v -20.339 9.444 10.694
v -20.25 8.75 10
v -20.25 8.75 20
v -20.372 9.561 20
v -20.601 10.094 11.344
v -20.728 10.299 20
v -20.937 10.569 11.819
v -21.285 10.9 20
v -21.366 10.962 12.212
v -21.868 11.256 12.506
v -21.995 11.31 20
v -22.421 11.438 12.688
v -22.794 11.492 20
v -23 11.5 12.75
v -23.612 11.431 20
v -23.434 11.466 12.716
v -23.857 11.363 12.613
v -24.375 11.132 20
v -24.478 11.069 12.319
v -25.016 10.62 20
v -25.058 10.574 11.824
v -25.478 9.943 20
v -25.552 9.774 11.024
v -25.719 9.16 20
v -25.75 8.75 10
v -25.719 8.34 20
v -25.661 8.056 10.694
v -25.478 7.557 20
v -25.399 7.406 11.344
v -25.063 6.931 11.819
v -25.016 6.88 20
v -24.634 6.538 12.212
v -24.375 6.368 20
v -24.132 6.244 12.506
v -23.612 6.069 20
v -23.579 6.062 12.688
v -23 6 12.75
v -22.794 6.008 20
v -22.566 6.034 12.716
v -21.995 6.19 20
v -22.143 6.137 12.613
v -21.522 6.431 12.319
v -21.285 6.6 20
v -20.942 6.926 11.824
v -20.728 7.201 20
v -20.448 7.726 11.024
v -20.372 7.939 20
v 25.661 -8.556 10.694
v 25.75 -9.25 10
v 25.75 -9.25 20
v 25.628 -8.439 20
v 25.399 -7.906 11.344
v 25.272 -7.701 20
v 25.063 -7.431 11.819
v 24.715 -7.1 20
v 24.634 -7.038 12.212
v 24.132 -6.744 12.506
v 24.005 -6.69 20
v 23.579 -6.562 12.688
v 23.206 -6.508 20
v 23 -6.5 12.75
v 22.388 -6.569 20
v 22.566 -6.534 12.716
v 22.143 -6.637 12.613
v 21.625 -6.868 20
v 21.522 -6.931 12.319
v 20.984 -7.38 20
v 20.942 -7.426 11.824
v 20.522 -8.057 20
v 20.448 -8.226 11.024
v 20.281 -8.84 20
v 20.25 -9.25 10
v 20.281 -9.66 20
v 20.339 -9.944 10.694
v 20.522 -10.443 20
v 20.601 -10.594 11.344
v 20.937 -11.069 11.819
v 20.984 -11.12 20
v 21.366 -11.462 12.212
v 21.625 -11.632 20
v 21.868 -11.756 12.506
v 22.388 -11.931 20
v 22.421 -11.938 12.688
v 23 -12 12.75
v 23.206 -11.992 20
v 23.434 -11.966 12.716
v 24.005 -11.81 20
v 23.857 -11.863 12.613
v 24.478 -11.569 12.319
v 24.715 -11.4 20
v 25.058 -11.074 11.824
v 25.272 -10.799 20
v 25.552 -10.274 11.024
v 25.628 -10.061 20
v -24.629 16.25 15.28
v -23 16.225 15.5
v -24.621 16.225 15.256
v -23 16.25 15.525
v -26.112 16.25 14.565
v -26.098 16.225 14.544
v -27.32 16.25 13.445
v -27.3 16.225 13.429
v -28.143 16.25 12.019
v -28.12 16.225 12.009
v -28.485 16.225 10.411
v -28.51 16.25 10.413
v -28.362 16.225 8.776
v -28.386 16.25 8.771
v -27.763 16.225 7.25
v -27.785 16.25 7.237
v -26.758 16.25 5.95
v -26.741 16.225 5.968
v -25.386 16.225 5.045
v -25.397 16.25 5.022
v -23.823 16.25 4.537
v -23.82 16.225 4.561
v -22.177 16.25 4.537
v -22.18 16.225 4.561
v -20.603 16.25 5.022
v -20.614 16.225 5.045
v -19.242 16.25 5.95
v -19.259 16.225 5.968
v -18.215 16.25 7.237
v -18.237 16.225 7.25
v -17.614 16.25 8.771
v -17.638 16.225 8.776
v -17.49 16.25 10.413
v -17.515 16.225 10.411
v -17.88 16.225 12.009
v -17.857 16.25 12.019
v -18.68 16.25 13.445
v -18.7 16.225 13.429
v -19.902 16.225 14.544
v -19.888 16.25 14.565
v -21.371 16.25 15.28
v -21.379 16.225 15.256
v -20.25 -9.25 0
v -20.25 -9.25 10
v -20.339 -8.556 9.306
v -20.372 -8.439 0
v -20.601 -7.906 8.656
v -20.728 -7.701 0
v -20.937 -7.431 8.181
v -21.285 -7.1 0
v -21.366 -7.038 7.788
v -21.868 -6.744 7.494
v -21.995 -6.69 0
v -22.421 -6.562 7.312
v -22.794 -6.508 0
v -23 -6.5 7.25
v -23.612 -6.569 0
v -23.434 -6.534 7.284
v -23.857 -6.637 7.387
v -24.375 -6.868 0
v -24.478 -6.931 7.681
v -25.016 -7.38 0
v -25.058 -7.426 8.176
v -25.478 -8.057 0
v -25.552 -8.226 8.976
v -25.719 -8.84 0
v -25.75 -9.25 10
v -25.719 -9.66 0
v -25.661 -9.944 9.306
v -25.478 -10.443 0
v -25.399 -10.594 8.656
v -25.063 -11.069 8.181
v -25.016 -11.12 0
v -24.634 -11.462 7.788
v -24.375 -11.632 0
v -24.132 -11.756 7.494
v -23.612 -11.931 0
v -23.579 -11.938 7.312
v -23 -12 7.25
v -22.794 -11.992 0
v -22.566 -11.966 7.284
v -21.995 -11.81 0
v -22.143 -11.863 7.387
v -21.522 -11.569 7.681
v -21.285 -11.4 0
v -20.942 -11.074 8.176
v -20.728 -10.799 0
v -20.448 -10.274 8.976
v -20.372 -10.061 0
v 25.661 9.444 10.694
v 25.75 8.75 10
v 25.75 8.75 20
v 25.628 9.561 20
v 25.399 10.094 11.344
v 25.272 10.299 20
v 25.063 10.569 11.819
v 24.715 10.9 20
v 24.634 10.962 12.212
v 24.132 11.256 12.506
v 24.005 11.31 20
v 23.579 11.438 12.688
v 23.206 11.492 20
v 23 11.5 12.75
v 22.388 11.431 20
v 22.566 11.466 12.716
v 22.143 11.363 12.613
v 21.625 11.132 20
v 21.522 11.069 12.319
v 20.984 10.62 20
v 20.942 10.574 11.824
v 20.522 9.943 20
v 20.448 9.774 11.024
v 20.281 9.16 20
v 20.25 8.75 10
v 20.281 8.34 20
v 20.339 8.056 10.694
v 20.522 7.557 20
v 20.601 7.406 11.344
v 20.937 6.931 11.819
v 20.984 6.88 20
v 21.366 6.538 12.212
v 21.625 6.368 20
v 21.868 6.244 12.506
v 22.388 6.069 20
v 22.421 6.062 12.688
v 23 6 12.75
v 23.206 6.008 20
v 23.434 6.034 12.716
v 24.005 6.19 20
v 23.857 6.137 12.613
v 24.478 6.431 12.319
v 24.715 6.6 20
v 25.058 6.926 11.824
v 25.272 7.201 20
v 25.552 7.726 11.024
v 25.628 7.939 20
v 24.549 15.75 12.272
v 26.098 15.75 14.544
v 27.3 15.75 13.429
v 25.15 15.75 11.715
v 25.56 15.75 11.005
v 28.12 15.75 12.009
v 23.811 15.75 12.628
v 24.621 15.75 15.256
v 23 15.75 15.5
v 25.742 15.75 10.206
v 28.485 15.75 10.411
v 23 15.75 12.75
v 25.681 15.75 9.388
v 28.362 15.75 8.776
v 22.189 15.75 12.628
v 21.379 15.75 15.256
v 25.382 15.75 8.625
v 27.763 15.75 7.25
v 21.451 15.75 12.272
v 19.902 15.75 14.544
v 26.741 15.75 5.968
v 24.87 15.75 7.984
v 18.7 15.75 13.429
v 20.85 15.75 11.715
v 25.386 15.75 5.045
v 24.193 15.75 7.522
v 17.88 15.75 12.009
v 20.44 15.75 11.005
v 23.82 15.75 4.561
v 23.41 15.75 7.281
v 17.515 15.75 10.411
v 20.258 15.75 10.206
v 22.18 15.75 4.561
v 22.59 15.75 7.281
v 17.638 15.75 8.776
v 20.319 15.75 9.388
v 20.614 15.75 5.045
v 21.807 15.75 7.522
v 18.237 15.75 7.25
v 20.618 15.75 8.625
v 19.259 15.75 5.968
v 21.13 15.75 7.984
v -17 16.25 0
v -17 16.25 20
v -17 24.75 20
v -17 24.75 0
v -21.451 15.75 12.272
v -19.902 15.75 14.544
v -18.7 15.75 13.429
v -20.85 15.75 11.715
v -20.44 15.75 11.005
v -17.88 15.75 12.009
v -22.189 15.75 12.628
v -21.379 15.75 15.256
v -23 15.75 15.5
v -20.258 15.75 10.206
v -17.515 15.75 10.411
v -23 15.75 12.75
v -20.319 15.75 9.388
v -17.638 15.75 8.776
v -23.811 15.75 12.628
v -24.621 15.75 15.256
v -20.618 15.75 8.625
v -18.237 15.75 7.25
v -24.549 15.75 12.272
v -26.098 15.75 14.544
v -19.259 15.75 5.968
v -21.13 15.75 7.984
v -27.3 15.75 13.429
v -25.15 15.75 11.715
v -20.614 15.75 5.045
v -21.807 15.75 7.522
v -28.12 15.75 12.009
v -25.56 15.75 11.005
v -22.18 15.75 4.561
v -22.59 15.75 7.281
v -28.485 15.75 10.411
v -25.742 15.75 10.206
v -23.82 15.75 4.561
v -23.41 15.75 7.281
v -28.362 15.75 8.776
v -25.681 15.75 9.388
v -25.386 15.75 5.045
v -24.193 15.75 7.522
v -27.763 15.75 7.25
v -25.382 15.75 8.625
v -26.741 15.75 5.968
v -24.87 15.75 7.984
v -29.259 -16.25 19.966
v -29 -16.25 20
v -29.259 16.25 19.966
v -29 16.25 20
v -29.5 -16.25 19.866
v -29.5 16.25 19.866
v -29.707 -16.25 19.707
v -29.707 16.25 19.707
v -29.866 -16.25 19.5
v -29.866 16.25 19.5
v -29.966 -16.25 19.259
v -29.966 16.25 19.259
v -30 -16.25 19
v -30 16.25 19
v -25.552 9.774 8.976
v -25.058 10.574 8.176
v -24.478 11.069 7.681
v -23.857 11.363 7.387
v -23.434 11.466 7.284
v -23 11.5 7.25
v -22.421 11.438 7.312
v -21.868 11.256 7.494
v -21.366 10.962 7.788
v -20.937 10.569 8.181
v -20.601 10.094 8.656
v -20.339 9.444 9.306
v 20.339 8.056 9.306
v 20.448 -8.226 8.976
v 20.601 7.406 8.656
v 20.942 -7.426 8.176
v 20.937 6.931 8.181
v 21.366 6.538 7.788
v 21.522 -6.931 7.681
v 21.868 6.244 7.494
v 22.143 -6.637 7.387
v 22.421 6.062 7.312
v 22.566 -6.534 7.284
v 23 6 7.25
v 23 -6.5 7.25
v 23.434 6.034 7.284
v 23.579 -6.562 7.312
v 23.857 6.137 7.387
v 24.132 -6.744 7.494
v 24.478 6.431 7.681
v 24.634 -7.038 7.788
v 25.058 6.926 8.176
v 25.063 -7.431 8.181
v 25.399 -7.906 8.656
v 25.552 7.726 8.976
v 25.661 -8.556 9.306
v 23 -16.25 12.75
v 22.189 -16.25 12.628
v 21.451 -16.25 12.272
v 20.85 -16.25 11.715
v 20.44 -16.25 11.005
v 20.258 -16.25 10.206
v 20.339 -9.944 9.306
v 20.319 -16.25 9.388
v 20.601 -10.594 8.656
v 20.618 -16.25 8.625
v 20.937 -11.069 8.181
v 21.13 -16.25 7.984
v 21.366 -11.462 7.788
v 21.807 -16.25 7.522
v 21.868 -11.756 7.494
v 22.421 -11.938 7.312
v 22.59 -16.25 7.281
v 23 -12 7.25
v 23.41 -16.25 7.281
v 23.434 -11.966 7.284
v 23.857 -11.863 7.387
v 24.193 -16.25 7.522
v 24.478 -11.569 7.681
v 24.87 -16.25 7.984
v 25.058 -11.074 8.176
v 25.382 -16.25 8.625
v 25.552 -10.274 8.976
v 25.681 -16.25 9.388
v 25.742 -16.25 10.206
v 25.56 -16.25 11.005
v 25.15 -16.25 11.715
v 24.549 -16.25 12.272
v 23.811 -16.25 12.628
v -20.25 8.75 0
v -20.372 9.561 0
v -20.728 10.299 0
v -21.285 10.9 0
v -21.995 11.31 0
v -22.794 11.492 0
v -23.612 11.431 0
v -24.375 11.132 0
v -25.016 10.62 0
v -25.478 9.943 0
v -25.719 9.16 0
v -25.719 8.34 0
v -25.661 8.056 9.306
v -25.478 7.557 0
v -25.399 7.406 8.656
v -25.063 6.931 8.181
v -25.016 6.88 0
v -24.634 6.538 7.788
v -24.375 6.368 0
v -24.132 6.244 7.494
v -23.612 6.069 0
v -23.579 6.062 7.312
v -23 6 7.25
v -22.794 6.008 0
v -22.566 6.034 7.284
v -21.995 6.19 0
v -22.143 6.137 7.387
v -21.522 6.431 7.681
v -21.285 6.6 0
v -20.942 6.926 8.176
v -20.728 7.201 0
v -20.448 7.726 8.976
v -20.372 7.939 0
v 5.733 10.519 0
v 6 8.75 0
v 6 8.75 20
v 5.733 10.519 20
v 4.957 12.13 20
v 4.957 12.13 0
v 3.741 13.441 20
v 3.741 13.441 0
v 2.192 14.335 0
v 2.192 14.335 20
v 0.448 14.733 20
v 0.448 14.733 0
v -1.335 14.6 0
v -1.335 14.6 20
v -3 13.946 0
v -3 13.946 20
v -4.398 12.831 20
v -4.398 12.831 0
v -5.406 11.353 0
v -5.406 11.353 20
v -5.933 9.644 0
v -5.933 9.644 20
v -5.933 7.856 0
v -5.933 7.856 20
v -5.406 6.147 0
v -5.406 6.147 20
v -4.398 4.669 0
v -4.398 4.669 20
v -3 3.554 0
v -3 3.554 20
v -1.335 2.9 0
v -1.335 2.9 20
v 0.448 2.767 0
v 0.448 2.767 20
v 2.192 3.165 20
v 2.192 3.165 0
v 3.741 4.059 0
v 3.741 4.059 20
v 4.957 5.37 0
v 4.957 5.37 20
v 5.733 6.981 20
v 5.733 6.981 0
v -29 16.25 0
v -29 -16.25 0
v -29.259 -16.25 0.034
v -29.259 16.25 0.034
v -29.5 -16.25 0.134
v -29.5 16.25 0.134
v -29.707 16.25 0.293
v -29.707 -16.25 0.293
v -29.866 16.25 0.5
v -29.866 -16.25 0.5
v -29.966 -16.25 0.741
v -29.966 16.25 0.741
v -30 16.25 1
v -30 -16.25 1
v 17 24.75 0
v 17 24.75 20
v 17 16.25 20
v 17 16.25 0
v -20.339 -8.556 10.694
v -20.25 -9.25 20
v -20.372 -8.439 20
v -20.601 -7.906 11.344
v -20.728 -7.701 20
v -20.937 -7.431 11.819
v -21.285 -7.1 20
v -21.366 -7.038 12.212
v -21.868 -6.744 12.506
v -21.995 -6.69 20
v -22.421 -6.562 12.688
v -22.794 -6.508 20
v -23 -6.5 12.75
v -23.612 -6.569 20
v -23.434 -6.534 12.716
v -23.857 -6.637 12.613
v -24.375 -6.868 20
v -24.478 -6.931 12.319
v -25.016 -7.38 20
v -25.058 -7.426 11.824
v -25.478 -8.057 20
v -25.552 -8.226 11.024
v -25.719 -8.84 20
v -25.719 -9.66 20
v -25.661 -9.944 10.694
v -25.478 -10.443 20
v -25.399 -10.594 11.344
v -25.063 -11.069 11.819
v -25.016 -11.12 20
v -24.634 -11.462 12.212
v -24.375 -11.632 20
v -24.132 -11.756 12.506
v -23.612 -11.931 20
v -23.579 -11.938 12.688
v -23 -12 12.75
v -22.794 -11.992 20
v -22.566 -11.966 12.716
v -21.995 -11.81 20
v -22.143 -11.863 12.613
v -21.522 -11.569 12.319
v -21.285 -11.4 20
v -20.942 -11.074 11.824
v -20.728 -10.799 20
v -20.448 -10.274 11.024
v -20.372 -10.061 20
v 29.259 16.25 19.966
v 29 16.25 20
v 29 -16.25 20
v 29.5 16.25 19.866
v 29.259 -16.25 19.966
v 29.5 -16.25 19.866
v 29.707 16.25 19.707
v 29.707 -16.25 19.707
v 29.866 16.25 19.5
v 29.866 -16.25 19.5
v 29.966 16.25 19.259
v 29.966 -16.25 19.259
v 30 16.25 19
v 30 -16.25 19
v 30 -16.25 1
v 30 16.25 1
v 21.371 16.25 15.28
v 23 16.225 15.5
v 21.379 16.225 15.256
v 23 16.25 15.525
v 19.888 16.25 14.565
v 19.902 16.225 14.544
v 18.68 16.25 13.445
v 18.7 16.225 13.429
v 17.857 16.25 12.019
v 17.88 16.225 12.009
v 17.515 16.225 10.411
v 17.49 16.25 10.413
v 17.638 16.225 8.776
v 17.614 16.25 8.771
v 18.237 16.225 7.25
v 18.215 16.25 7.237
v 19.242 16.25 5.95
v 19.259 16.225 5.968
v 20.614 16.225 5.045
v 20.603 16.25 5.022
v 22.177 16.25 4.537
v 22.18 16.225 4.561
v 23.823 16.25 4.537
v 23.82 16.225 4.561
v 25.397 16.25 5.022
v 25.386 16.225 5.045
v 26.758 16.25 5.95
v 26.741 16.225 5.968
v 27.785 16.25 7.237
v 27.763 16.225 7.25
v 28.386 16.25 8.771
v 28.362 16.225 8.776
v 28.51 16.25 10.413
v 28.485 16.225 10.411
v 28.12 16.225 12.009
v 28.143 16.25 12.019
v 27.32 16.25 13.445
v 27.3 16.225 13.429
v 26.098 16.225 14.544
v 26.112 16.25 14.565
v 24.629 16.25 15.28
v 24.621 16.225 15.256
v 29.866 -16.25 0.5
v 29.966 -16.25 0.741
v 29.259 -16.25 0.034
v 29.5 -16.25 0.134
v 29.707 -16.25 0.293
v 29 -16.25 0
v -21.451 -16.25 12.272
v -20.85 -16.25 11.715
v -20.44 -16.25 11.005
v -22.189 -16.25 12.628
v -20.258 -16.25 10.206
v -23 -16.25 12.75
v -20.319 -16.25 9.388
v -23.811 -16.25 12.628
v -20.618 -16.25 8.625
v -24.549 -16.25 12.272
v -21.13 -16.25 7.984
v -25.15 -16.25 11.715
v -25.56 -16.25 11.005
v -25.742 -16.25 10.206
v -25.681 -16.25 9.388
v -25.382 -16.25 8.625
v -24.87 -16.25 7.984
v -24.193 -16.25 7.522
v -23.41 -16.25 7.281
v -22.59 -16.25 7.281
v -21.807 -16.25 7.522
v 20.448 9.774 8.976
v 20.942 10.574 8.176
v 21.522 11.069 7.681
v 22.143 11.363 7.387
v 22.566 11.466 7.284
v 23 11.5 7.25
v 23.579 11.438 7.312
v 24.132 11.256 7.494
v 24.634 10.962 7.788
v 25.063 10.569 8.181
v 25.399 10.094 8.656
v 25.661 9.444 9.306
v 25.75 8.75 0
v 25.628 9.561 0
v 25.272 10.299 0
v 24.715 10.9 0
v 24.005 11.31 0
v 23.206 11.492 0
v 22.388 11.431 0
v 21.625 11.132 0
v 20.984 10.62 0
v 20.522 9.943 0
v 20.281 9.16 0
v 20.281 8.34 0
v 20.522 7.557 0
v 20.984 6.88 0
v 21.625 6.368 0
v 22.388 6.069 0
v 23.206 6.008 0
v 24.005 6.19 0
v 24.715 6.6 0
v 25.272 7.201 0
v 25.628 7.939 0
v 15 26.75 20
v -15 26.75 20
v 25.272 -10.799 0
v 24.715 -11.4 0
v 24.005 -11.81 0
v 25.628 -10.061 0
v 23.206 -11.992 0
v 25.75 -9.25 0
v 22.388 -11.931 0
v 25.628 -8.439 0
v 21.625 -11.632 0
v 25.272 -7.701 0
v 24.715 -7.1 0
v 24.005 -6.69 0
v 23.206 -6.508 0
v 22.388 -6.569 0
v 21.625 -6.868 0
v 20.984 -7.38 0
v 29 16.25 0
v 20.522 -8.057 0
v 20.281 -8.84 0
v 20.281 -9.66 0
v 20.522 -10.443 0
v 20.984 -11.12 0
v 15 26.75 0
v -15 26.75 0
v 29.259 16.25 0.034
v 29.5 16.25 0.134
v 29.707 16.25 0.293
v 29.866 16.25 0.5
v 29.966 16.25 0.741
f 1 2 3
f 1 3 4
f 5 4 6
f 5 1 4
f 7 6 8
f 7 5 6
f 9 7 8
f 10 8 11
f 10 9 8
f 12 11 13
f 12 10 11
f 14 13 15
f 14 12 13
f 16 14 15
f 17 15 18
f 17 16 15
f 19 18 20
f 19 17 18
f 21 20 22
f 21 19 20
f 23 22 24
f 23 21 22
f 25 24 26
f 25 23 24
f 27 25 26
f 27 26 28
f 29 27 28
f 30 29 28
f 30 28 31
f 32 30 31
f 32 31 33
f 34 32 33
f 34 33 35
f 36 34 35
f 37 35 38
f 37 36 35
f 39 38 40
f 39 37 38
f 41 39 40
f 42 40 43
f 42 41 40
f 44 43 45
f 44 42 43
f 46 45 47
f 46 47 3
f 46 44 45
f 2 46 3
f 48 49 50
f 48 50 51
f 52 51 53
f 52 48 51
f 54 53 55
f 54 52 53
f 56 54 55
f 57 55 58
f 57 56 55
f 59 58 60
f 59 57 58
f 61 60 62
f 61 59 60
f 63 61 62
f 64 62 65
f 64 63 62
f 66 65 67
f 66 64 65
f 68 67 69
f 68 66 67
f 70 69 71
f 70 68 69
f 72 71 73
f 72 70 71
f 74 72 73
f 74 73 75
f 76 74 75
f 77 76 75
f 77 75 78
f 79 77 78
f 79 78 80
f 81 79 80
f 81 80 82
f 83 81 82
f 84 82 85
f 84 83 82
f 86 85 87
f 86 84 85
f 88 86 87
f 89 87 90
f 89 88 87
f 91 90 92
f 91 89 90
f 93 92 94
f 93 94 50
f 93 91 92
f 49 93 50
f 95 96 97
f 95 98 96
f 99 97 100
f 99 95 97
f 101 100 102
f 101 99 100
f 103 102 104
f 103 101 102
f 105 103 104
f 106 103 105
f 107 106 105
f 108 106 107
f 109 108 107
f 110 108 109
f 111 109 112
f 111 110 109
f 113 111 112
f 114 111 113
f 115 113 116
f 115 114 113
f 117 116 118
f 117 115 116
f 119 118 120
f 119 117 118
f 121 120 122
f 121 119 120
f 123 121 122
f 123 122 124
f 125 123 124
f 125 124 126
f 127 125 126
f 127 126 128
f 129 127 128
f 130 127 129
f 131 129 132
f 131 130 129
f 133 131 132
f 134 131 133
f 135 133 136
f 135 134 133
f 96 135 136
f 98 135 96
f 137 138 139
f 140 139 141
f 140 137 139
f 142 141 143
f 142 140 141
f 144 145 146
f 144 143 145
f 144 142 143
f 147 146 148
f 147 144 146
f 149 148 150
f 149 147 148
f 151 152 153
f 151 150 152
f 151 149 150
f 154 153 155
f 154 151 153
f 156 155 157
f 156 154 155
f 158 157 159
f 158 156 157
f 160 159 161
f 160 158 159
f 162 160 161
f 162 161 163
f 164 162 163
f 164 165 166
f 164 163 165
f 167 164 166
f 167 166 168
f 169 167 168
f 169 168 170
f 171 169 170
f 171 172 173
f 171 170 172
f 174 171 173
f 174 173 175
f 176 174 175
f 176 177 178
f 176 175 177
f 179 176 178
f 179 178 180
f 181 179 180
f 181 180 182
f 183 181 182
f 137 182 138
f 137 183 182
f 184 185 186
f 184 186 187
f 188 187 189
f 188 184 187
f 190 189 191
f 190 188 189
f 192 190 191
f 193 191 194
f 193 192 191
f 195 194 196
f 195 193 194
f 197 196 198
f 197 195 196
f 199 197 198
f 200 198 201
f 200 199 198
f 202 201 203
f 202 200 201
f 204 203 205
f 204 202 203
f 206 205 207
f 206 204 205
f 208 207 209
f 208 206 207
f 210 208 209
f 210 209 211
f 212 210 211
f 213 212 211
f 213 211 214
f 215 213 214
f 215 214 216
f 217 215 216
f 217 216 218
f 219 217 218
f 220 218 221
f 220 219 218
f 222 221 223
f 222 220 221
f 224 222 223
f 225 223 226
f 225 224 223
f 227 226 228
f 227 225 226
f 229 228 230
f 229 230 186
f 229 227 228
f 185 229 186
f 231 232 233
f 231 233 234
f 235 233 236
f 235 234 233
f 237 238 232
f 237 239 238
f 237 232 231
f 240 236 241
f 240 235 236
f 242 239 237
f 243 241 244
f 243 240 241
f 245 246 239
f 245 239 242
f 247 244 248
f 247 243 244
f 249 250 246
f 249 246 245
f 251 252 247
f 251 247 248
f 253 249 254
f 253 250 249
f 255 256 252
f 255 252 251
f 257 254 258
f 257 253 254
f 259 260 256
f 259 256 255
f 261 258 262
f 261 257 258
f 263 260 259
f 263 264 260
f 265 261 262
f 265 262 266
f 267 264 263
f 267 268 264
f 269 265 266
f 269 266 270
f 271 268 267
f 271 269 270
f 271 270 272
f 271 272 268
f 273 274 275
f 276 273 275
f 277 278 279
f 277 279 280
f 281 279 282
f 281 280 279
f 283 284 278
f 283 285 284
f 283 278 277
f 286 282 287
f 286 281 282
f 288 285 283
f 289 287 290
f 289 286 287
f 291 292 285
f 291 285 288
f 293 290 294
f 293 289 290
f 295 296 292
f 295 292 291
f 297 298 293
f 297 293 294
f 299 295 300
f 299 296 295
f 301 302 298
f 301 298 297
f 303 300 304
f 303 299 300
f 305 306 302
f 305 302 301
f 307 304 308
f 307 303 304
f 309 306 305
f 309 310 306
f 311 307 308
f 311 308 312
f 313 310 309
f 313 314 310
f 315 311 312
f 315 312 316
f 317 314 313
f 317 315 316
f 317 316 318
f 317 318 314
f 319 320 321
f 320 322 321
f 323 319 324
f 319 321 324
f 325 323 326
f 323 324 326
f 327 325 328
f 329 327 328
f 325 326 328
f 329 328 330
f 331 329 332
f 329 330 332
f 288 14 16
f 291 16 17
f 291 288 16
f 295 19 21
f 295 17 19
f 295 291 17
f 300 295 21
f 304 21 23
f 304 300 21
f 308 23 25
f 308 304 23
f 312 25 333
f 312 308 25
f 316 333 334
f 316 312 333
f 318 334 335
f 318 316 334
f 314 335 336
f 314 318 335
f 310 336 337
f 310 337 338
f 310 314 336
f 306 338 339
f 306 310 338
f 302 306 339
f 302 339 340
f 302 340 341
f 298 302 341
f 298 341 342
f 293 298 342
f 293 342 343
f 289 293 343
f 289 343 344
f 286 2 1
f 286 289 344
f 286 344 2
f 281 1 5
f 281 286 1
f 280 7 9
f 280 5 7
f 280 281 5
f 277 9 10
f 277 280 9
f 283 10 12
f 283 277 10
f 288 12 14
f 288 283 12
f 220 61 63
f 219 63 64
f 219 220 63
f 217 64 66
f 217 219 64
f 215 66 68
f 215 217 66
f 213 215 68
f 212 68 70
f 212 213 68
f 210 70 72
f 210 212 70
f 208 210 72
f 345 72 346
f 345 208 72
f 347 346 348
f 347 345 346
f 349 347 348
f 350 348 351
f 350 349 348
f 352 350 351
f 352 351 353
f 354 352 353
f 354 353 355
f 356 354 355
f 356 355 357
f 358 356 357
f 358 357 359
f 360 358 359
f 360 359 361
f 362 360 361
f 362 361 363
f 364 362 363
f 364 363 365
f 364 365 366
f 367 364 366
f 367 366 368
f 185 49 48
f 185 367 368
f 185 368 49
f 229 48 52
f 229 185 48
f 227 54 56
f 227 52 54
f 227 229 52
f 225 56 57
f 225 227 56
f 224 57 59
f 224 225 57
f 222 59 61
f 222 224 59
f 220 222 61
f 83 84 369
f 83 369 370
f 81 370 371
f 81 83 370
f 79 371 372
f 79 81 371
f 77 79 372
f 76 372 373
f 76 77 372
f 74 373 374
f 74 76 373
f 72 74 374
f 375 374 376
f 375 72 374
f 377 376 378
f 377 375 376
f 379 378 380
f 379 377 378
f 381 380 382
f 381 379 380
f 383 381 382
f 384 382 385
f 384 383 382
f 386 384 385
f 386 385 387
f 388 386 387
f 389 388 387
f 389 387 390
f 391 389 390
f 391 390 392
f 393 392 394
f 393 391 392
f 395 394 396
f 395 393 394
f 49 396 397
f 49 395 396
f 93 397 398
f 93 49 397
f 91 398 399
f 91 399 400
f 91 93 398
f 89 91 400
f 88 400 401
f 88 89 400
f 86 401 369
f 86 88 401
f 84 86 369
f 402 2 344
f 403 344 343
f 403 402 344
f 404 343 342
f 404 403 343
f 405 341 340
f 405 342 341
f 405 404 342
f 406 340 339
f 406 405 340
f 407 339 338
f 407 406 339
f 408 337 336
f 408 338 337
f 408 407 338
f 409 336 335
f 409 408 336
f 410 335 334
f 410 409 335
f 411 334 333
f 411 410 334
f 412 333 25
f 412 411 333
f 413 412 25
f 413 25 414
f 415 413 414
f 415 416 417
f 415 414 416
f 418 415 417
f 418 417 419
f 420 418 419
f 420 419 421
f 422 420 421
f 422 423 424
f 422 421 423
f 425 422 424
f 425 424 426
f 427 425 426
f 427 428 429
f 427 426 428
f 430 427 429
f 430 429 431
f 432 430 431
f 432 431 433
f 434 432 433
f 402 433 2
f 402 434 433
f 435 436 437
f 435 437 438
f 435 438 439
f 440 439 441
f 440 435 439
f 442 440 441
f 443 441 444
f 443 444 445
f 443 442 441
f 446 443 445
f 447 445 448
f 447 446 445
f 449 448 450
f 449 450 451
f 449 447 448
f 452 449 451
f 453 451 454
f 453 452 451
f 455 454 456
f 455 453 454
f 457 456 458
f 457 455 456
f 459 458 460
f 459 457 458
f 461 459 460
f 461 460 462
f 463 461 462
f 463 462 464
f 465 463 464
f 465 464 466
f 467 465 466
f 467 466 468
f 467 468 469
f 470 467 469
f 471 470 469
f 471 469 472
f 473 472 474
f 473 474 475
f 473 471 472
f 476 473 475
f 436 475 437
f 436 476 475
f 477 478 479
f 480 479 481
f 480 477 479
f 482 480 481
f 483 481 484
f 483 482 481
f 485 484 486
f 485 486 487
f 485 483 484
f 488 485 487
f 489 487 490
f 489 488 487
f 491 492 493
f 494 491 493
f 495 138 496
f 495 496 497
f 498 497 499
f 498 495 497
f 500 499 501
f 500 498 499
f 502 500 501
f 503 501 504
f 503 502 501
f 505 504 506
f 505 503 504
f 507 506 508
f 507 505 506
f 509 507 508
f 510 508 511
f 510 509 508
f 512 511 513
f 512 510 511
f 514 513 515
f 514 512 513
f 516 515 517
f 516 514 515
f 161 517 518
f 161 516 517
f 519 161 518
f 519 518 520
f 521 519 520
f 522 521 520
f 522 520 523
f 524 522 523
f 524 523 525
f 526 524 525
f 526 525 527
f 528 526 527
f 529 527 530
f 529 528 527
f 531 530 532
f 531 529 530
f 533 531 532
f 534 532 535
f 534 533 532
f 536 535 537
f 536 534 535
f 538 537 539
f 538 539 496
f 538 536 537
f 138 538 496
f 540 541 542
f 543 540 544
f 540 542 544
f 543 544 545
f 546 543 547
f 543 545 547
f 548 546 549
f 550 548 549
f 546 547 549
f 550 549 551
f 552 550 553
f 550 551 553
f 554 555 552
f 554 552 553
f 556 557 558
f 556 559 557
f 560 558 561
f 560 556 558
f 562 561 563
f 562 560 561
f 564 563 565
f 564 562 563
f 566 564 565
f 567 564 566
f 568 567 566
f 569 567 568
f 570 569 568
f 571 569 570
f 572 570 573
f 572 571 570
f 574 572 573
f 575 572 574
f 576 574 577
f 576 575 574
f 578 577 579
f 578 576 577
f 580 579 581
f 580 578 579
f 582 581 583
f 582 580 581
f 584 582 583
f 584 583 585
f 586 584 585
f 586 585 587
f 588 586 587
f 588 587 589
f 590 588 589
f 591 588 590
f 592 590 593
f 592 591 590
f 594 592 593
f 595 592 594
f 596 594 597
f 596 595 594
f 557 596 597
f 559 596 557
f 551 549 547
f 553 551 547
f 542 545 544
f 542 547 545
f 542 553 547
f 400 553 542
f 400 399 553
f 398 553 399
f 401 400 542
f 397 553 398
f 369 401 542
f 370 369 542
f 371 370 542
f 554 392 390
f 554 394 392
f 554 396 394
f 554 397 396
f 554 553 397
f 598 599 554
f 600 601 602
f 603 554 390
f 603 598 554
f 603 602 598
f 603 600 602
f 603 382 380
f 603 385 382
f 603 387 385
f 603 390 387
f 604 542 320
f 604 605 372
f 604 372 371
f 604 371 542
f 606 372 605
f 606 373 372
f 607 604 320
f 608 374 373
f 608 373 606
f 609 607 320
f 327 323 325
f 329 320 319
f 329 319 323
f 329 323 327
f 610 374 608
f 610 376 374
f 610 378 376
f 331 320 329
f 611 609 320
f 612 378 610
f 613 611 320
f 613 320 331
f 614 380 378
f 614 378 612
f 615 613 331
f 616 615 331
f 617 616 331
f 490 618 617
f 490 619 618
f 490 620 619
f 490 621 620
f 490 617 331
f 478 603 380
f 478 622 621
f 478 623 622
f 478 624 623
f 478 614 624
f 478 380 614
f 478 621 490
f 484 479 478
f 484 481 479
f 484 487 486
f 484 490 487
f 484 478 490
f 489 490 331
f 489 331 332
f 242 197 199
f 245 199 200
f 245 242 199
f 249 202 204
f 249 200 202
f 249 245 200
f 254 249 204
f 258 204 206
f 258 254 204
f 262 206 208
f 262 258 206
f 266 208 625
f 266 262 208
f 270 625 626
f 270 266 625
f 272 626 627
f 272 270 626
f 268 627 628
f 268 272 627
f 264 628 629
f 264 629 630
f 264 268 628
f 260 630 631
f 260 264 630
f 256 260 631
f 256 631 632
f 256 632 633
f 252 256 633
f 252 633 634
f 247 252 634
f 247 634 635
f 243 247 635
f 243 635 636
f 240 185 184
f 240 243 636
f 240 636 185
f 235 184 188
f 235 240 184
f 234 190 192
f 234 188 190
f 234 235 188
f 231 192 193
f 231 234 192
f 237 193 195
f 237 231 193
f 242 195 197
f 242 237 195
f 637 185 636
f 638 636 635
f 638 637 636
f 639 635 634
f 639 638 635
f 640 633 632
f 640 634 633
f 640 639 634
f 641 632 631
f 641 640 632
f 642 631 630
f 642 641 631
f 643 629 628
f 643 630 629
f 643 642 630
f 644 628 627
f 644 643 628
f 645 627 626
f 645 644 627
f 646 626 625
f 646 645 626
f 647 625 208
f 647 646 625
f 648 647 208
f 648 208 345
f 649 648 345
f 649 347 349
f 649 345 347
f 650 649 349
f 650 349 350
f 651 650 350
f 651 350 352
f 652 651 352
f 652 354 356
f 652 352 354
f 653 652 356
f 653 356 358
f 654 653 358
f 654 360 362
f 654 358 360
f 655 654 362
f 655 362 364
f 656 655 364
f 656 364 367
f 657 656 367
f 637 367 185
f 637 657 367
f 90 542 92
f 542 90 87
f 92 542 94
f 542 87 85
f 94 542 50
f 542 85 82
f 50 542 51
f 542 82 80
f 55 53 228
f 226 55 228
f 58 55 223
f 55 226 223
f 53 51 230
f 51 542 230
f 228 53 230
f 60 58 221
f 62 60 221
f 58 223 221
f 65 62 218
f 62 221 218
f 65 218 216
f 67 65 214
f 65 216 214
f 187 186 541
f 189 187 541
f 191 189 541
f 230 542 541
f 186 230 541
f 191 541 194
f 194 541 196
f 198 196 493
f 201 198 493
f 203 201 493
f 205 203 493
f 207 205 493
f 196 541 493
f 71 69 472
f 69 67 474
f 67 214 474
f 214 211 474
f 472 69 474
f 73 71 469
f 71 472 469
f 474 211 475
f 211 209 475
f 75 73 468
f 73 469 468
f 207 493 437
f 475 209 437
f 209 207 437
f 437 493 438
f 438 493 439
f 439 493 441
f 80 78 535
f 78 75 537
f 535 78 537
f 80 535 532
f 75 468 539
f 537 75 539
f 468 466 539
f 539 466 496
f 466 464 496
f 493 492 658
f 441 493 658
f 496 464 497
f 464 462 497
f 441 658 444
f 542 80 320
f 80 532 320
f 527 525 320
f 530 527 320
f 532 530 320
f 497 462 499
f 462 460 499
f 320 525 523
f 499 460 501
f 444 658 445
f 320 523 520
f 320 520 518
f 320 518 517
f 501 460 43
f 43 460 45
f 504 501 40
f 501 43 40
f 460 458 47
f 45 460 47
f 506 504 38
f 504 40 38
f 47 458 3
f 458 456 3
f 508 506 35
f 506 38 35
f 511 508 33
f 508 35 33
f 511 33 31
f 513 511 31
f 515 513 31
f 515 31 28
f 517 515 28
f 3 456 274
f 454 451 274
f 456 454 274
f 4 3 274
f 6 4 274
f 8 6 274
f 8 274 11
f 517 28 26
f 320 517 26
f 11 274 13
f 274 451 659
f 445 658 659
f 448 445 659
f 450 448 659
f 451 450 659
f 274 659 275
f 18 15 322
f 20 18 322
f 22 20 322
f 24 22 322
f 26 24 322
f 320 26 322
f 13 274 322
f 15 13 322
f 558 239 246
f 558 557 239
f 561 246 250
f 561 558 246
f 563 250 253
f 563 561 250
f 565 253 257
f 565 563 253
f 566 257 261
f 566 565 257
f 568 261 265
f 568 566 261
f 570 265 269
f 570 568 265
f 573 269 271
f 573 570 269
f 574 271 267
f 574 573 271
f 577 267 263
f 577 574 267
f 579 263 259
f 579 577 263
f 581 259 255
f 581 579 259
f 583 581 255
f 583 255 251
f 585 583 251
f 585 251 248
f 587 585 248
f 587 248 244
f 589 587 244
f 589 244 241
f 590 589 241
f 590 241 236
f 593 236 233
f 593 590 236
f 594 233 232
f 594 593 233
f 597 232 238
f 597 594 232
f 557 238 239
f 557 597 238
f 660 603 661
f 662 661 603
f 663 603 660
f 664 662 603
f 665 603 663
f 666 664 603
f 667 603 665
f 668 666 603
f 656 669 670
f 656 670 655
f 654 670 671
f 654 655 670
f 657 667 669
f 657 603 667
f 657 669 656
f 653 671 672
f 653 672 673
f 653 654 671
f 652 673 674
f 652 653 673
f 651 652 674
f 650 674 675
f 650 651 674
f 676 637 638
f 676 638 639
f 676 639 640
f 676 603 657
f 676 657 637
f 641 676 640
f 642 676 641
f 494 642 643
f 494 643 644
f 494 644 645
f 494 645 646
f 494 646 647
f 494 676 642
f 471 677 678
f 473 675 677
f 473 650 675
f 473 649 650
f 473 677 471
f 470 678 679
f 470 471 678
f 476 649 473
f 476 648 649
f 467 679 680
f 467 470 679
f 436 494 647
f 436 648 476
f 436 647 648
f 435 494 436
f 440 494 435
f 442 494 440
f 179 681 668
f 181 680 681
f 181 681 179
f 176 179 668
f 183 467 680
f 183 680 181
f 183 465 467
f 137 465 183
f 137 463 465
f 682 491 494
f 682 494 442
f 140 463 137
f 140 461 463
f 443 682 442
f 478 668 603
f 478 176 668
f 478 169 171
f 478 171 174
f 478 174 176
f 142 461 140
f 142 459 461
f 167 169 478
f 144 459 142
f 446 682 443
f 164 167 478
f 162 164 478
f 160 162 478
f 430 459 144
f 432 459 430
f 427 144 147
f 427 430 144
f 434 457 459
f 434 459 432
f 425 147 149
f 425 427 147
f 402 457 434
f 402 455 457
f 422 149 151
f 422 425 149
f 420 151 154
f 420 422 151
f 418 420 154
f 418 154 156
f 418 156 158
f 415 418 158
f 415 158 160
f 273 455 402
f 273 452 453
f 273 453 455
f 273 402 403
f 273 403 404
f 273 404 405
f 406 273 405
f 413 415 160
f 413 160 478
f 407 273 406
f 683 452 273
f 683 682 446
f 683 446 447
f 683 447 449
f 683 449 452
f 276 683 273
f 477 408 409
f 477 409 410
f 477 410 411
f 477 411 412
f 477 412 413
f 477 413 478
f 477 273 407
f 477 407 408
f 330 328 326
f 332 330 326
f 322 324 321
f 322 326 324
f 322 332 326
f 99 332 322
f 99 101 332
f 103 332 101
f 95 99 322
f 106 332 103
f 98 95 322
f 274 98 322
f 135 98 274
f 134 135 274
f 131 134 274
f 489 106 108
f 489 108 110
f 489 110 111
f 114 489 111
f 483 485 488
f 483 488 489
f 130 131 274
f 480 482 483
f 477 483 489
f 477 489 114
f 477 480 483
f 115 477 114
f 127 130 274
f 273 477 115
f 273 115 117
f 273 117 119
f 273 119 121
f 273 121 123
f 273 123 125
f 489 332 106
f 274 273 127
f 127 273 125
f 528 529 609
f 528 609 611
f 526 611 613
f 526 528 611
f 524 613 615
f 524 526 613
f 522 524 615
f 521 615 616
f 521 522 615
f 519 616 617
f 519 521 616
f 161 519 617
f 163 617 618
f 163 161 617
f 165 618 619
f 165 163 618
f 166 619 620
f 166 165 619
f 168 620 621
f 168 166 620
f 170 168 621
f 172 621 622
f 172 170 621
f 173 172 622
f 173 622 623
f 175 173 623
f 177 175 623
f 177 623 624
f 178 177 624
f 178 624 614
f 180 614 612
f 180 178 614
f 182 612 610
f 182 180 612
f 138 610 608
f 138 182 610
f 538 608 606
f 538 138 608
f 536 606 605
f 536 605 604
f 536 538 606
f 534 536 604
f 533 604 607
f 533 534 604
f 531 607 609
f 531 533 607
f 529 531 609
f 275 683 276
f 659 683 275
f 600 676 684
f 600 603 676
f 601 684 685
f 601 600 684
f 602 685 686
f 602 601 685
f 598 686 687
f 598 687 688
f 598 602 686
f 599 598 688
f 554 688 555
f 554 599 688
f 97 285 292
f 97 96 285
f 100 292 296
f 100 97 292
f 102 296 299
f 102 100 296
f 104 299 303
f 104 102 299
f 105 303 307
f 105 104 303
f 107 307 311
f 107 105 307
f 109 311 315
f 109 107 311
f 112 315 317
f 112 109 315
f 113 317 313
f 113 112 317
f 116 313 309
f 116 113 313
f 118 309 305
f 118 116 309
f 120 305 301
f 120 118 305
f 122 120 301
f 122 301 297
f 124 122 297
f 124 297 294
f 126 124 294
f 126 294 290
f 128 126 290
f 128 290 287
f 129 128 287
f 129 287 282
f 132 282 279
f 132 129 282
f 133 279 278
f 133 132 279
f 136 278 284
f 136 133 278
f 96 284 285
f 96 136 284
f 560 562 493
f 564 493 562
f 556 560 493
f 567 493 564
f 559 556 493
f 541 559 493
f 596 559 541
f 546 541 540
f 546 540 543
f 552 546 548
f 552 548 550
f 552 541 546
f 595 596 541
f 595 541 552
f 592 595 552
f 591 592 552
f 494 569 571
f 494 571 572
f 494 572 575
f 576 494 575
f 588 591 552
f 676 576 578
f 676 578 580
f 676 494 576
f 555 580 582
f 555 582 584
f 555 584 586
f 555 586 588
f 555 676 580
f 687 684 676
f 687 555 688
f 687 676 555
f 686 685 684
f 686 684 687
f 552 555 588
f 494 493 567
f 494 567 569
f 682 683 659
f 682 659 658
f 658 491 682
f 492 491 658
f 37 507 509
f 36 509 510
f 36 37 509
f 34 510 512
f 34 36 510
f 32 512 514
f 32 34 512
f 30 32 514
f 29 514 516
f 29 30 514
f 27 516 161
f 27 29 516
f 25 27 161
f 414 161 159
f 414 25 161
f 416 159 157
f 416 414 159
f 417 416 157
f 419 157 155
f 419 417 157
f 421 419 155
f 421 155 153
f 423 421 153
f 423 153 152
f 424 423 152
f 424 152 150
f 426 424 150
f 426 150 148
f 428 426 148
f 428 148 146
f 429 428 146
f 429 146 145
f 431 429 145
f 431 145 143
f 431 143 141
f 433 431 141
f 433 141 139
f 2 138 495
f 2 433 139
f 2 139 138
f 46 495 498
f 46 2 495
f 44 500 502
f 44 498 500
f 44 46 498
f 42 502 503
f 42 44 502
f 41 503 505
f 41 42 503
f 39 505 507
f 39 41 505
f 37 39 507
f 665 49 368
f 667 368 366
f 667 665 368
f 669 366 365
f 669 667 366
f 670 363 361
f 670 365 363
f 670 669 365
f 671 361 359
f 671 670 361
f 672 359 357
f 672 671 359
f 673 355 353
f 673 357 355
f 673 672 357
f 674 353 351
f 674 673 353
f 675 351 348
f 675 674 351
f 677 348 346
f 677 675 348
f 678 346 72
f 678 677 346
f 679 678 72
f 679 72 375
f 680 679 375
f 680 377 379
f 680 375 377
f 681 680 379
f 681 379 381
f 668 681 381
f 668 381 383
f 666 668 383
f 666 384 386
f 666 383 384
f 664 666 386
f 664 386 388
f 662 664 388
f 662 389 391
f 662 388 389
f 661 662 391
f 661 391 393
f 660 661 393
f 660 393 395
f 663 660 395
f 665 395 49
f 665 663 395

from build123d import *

# Parameters (mm, degrees)
SKETCH_1_R                  = 6
SKETCH_1_R_2                = 2.75
EXTRUDE_1_DEPTH             = 20
CHAMFER_1_SIZE              = 2
FILLET_1_R                  = 1
HOLE_WIZARD_M5_1_AT_2_COUNT = 2
HOLE_WIZARD_M5_1_AT_2_PITCH = 46


with BuildPart() as part:
    # 草图1 → 凸台-拉伸1 (new body)
    with BuildSketch(Plane.XY):
        Polygon((-17, 16.25), (-17, 26.75), (17, 26.75), (17, 16.25), (30, 16.25), (30, -16.25), (-30, -16.25), (-30, 16.25), align=None)
        with Locations((0, 8.75)):
            Circle(SKETCH_1_R, mode=Mode.SUBTRACT)
        with Locations((-23, 8.75)):
            Circle(SKETCH_1_R_2, mode=Mode.SUBTRACT)
        with Locations((-23, -9.25)):
            Circle(SKETCH_1_R_2, mode=Mode.SUBTRACT)
        with Locations((23, -9.25)):
            Circle(SKETCH_1_R_2, mode=Mode.SUBTRACT)
        with Locations((23, 8.75)):
            Circle(SKETCH_1_R_2, mode=Mode.SUBTRACT)
    extrude(amount=EXTRUDE_1_DEPTH)

    # 倒角1
    chamfer_1_edges = [part.edges().sort_by_distance(p)[0] for p in [
        (-17, 26.75, 10),
        (17, 26.75, 10),
    ]]
    chamfer(chamfer_1_edges, length=CHAMFER_1_SIZE)

    # 圆角1
    fillet_1_edges = [part.edges().sort_by_distance(p)[0] for p in [
        (30, 0, 0),
        (-30, 0, 20),
        (30, 0, 20),
        (-30, 0, 0),
    ]]
    fillet(fillet_1_edges, radius=FILLET_1_R)

    # 草图3 → M5 六角头螺栓的柱形沉头孔1 (revolve, cut)
    with BuildSketch(Plane(origin=(23, 16.25, 10), x_dir=(0, 0, 1), z_dir=(1, 0, 0))):
        Polygon((0, 0), (0, 32.5), (2.75, 32.5), (2.75, 0.5), (5.5, 0.5), (5.5, 0.025), (5.525, 0), align=None)
    hole_wizard_m5_1 = revolve(axis=Axis((23, 22.6, 10), (0, -1, 0)), mode=Mode.SUBTRACT)

    # M5 六角头螺栓的柱形沉头孔1 at 2: M5 六角头螺栓的柱形沉头孔1 ×2
    with Locations(*[(-i * HOLE_WIZARD_M5_1_AT_2_PITCH, 0, 0) for i in range(1, HOLE_WIZARD_M5_1_AT_2_COUNT)]):
        add(hole_wizard_m5_1, mode=Mode.SUBTRACT)


solid = part.part
